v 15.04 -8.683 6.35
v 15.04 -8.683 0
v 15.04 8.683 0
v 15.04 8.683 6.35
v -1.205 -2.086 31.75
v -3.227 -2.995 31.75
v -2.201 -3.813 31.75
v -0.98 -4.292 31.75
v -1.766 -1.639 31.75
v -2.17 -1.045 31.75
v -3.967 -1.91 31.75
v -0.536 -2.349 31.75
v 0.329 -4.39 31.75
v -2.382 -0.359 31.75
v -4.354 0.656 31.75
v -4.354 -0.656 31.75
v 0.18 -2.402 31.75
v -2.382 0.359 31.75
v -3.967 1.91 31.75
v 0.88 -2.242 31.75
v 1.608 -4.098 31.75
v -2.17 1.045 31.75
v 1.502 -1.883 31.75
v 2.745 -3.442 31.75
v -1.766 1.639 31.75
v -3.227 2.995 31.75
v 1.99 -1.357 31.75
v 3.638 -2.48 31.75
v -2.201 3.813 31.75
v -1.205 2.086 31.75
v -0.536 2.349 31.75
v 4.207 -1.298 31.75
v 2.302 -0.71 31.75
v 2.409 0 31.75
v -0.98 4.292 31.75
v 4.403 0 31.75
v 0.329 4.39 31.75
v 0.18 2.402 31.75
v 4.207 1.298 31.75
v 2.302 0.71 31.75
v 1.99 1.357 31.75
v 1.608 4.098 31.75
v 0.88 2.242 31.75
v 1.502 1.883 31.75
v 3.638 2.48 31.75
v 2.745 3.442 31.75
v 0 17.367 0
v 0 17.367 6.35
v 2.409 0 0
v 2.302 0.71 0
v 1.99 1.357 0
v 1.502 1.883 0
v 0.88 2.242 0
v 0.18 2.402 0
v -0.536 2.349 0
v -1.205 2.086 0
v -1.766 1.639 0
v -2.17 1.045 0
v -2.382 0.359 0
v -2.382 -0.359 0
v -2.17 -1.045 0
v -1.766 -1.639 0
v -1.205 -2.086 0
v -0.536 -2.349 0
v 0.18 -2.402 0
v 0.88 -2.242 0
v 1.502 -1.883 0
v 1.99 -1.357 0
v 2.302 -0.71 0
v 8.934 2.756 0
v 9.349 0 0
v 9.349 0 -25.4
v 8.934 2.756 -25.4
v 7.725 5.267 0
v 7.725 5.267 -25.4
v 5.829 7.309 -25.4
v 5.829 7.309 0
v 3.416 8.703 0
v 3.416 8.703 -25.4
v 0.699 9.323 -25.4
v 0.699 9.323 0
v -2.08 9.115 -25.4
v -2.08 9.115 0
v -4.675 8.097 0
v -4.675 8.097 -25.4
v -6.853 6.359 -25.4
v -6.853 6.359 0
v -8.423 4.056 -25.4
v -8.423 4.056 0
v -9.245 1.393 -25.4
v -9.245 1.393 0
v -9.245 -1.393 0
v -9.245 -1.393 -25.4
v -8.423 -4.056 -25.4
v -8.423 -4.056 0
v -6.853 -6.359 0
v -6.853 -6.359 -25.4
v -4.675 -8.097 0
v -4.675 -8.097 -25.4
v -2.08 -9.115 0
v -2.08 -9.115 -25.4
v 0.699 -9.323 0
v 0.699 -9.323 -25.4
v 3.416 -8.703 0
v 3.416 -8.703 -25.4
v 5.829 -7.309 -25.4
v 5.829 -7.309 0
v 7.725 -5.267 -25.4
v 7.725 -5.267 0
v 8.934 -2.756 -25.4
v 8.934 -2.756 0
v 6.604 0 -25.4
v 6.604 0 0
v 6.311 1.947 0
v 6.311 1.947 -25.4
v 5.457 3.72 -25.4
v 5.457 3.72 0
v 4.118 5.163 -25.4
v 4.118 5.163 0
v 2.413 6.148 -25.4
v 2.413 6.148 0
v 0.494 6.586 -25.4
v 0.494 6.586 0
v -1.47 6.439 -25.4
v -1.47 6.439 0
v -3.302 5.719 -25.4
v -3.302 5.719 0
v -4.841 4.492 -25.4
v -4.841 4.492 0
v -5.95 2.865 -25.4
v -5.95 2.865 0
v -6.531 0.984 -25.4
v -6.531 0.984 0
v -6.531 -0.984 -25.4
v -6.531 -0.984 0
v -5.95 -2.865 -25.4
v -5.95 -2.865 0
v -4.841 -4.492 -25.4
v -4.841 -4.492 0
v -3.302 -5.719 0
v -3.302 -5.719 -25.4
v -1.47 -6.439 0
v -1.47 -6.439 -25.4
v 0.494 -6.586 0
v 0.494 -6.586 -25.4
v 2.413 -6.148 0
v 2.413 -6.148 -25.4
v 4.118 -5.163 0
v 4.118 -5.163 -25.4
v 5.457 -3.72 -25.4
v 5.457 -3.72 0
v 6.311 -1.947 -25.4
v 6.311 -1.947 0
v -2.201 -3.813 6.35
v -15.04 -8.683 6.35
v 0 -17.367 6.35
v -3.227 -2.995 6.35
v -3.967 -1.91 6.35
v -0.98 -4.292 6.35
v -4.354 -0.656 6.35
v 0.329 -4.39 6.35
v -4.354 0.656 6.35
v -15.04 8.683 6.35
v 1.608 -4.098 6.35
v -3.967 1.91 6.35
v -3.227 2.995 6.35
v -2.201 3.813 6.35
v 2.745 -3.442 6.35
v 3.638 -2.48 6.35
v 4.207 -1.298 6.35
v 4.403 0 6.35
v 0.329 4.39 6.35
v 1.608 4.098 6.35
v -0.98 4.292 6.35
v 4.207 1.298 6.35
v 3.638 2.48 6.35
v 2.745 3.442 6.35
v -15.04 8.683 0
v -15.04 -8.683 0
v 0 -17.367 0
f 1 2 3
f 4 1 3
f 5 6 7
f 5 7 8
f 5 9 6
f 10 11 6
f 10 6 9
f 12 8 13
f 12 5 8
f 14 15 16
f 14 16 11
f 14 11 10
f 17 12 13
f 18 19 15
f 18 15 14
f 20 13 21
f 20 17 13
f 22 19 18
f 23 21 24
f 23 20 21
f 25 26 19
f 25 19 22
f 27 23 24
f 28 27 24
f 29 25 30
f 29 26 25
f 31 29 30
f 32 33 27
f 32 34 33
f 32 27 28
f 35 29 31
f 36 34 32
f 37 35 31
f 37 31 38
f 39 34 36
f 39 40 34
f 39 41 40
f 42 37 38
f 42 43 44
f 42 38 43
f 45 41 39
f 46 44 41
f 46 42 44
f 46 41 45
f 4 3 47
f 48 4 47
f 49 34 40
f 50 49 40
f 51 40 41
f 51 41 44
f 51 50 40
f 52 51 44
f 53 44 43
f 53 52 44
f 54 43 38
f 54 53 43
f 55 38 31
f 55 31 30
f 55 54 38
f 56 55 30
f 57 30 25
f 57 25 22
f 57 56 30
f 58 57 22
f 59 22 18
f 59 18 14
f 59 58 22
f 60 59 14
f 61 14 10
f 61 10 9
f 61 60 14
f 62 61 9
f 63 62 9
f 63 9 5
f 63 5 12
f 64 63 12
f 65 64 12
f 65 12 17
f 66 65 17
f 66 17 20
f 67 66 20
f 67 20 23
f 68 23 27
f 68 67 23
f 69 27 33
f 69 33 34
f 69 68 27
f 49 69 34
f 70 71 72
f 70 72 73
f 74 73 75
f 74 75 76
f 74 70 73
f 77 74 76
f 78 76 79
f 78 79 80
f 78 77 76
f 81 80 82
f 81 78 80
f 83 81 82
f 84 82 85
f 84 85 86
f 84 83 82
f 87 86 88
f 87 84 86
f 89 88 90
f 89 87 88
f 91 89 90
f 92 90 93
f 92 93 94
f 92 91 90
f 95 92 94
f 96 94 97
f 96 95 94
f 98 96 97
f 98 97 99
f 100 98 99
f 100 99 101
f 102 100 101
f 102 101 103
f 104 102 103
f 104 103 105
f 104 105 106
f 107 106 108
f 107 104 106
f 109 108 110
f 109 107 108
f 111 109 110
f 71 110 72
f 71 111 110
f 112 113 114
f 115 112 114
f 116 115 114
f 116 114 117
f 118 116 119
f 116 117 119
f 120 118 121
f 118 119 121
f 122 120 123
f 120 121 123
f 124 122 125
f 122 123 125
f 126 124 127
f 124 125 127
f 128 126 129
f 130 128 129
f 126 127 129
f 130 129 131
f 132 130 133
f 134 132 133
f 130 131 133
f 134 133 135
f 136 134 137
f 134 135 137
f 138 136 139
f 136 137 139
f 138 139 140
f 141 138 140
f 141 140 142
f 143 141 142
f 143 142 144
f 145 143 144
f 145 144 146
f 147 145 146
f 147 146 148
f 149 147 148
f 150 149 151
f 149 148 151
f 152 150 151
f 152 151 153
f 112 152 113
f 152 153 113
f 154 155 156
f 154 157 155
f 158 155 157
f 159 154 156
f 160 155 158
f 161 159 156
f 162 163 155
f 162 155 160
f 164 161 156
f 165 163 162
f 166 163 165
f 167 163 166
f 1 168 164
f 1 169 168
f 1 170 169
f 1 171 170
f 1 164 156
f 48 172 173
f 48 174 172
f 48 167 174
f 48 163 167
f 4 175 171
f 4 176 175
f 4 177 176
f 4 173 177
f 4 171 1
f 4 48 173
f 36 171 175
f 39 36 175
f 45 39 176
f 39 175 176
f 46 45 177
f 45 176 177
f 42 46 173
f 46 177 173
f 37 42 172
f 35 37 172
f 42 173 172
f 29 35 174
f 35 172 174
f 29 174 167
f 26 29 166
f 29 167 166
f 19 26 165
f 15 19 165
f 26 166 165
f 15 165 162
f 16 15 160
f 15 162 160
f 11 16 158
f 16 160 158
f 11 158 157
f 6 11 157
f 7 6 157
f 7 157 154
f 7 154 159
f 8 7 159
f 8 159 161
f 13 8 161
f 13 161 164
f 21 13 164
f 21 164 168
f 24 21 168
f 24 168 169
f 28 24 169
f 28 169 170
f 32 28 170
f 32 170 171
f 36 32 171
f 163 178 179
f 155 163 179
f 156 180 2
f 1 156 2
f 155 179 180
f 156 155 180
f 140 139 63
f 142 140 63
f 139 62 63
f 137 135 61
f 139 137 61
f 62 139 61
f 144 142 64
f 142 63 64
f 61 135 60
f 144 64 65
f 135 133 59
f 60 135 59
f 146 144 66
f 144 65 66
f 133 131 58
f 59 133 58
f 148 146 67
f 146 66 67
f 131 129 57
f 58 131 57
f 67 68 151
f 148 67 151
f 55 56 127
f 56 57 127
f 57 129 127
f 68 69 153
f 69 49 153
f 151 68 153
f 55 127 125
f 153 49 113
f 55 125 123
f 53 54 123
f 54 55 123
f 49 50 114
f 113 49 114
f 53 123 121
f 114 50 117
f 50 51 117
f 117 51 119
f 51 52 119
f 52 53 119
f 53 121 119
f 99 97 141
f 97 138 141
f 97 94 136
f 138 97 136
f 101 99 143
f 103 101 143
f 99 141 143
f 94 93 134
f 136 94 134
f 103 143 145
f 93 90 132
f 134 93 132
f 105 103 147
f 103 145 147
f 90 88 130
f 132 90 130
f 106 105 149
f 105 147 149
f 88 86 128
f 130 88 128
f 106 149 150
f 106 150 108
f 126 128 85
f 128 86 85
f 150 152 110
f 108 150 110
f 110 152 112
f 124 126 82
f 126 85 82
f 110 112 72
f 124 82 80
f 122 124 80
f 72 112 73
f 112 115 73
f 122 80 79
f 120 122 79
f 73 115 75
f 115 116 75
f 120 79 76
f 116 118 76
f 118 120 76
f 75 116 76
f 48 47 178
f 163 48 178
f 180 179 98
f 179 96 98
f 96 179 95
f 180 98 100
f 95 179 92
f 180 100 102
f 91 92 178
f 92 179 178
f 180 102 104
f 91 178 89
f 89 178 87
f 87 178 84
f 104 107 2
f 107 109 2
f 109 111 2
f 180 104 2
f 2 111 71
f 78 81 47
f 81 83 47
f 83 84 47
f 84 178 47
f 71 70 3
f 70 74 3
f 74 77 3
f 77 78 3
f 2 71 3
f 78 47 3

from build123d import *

# Parameters (mm, degrees)
F0_R     = 9.349188324
F0_R_2   = 6.6042884463
F0_R_3   = 4.4026997979
F1_DEPTH = 6.35
F0_R_4   = 2.4090089184
F2_DEPTH = 31.75
F3_DEPTH = 25.4


# Not quite as in the source:
# - a length typed as a fraction of an inch, garbled in the dataset ("3 / 203.2 mm" for 3/8 in), is restored


with BuildPart() as f1:
    # F0 (on Top) → F1 (new body)
    with BuildSketch(Plane.XY):
        Polygon((15.0401592255, -8.6834399775), (15.0401592255, 8.6834399775), (0, 17.366879955), (-15.0401592255, 8.6834399775), (-15.0401592255, -8.6834399775), (0, -17.366879955), align=None)
        Circle(F0_R, mode=Mode.SUBTRACT)
        Circle(F0_R)
        Circle(F0_R_2, mode=Mode.SUBTRACT)
        Circle(F0_R_2)
        Circle(F0_R_3, mode=Mode.SUBTRACT)
    extrude(amount=F1_DEPTH)

    # F0 (on Top) → F2 (join)
    with BuildSketch(Plane.XY):
        Circle(F0_R_3)
        Circle(F0_R_4, mode=Mode.SUBTRACT)
    extrude(amount=F2_DEPTH)

    # F0 (on Top) → F3 (join)
    with BuildSketch(Plane.XY):
        Circle(F0_R)
        Circle(F0_R_2, mode=Mode.SUBTRACT)
    extrude(amount=-F3_DEPTH)


solid = f1.part
